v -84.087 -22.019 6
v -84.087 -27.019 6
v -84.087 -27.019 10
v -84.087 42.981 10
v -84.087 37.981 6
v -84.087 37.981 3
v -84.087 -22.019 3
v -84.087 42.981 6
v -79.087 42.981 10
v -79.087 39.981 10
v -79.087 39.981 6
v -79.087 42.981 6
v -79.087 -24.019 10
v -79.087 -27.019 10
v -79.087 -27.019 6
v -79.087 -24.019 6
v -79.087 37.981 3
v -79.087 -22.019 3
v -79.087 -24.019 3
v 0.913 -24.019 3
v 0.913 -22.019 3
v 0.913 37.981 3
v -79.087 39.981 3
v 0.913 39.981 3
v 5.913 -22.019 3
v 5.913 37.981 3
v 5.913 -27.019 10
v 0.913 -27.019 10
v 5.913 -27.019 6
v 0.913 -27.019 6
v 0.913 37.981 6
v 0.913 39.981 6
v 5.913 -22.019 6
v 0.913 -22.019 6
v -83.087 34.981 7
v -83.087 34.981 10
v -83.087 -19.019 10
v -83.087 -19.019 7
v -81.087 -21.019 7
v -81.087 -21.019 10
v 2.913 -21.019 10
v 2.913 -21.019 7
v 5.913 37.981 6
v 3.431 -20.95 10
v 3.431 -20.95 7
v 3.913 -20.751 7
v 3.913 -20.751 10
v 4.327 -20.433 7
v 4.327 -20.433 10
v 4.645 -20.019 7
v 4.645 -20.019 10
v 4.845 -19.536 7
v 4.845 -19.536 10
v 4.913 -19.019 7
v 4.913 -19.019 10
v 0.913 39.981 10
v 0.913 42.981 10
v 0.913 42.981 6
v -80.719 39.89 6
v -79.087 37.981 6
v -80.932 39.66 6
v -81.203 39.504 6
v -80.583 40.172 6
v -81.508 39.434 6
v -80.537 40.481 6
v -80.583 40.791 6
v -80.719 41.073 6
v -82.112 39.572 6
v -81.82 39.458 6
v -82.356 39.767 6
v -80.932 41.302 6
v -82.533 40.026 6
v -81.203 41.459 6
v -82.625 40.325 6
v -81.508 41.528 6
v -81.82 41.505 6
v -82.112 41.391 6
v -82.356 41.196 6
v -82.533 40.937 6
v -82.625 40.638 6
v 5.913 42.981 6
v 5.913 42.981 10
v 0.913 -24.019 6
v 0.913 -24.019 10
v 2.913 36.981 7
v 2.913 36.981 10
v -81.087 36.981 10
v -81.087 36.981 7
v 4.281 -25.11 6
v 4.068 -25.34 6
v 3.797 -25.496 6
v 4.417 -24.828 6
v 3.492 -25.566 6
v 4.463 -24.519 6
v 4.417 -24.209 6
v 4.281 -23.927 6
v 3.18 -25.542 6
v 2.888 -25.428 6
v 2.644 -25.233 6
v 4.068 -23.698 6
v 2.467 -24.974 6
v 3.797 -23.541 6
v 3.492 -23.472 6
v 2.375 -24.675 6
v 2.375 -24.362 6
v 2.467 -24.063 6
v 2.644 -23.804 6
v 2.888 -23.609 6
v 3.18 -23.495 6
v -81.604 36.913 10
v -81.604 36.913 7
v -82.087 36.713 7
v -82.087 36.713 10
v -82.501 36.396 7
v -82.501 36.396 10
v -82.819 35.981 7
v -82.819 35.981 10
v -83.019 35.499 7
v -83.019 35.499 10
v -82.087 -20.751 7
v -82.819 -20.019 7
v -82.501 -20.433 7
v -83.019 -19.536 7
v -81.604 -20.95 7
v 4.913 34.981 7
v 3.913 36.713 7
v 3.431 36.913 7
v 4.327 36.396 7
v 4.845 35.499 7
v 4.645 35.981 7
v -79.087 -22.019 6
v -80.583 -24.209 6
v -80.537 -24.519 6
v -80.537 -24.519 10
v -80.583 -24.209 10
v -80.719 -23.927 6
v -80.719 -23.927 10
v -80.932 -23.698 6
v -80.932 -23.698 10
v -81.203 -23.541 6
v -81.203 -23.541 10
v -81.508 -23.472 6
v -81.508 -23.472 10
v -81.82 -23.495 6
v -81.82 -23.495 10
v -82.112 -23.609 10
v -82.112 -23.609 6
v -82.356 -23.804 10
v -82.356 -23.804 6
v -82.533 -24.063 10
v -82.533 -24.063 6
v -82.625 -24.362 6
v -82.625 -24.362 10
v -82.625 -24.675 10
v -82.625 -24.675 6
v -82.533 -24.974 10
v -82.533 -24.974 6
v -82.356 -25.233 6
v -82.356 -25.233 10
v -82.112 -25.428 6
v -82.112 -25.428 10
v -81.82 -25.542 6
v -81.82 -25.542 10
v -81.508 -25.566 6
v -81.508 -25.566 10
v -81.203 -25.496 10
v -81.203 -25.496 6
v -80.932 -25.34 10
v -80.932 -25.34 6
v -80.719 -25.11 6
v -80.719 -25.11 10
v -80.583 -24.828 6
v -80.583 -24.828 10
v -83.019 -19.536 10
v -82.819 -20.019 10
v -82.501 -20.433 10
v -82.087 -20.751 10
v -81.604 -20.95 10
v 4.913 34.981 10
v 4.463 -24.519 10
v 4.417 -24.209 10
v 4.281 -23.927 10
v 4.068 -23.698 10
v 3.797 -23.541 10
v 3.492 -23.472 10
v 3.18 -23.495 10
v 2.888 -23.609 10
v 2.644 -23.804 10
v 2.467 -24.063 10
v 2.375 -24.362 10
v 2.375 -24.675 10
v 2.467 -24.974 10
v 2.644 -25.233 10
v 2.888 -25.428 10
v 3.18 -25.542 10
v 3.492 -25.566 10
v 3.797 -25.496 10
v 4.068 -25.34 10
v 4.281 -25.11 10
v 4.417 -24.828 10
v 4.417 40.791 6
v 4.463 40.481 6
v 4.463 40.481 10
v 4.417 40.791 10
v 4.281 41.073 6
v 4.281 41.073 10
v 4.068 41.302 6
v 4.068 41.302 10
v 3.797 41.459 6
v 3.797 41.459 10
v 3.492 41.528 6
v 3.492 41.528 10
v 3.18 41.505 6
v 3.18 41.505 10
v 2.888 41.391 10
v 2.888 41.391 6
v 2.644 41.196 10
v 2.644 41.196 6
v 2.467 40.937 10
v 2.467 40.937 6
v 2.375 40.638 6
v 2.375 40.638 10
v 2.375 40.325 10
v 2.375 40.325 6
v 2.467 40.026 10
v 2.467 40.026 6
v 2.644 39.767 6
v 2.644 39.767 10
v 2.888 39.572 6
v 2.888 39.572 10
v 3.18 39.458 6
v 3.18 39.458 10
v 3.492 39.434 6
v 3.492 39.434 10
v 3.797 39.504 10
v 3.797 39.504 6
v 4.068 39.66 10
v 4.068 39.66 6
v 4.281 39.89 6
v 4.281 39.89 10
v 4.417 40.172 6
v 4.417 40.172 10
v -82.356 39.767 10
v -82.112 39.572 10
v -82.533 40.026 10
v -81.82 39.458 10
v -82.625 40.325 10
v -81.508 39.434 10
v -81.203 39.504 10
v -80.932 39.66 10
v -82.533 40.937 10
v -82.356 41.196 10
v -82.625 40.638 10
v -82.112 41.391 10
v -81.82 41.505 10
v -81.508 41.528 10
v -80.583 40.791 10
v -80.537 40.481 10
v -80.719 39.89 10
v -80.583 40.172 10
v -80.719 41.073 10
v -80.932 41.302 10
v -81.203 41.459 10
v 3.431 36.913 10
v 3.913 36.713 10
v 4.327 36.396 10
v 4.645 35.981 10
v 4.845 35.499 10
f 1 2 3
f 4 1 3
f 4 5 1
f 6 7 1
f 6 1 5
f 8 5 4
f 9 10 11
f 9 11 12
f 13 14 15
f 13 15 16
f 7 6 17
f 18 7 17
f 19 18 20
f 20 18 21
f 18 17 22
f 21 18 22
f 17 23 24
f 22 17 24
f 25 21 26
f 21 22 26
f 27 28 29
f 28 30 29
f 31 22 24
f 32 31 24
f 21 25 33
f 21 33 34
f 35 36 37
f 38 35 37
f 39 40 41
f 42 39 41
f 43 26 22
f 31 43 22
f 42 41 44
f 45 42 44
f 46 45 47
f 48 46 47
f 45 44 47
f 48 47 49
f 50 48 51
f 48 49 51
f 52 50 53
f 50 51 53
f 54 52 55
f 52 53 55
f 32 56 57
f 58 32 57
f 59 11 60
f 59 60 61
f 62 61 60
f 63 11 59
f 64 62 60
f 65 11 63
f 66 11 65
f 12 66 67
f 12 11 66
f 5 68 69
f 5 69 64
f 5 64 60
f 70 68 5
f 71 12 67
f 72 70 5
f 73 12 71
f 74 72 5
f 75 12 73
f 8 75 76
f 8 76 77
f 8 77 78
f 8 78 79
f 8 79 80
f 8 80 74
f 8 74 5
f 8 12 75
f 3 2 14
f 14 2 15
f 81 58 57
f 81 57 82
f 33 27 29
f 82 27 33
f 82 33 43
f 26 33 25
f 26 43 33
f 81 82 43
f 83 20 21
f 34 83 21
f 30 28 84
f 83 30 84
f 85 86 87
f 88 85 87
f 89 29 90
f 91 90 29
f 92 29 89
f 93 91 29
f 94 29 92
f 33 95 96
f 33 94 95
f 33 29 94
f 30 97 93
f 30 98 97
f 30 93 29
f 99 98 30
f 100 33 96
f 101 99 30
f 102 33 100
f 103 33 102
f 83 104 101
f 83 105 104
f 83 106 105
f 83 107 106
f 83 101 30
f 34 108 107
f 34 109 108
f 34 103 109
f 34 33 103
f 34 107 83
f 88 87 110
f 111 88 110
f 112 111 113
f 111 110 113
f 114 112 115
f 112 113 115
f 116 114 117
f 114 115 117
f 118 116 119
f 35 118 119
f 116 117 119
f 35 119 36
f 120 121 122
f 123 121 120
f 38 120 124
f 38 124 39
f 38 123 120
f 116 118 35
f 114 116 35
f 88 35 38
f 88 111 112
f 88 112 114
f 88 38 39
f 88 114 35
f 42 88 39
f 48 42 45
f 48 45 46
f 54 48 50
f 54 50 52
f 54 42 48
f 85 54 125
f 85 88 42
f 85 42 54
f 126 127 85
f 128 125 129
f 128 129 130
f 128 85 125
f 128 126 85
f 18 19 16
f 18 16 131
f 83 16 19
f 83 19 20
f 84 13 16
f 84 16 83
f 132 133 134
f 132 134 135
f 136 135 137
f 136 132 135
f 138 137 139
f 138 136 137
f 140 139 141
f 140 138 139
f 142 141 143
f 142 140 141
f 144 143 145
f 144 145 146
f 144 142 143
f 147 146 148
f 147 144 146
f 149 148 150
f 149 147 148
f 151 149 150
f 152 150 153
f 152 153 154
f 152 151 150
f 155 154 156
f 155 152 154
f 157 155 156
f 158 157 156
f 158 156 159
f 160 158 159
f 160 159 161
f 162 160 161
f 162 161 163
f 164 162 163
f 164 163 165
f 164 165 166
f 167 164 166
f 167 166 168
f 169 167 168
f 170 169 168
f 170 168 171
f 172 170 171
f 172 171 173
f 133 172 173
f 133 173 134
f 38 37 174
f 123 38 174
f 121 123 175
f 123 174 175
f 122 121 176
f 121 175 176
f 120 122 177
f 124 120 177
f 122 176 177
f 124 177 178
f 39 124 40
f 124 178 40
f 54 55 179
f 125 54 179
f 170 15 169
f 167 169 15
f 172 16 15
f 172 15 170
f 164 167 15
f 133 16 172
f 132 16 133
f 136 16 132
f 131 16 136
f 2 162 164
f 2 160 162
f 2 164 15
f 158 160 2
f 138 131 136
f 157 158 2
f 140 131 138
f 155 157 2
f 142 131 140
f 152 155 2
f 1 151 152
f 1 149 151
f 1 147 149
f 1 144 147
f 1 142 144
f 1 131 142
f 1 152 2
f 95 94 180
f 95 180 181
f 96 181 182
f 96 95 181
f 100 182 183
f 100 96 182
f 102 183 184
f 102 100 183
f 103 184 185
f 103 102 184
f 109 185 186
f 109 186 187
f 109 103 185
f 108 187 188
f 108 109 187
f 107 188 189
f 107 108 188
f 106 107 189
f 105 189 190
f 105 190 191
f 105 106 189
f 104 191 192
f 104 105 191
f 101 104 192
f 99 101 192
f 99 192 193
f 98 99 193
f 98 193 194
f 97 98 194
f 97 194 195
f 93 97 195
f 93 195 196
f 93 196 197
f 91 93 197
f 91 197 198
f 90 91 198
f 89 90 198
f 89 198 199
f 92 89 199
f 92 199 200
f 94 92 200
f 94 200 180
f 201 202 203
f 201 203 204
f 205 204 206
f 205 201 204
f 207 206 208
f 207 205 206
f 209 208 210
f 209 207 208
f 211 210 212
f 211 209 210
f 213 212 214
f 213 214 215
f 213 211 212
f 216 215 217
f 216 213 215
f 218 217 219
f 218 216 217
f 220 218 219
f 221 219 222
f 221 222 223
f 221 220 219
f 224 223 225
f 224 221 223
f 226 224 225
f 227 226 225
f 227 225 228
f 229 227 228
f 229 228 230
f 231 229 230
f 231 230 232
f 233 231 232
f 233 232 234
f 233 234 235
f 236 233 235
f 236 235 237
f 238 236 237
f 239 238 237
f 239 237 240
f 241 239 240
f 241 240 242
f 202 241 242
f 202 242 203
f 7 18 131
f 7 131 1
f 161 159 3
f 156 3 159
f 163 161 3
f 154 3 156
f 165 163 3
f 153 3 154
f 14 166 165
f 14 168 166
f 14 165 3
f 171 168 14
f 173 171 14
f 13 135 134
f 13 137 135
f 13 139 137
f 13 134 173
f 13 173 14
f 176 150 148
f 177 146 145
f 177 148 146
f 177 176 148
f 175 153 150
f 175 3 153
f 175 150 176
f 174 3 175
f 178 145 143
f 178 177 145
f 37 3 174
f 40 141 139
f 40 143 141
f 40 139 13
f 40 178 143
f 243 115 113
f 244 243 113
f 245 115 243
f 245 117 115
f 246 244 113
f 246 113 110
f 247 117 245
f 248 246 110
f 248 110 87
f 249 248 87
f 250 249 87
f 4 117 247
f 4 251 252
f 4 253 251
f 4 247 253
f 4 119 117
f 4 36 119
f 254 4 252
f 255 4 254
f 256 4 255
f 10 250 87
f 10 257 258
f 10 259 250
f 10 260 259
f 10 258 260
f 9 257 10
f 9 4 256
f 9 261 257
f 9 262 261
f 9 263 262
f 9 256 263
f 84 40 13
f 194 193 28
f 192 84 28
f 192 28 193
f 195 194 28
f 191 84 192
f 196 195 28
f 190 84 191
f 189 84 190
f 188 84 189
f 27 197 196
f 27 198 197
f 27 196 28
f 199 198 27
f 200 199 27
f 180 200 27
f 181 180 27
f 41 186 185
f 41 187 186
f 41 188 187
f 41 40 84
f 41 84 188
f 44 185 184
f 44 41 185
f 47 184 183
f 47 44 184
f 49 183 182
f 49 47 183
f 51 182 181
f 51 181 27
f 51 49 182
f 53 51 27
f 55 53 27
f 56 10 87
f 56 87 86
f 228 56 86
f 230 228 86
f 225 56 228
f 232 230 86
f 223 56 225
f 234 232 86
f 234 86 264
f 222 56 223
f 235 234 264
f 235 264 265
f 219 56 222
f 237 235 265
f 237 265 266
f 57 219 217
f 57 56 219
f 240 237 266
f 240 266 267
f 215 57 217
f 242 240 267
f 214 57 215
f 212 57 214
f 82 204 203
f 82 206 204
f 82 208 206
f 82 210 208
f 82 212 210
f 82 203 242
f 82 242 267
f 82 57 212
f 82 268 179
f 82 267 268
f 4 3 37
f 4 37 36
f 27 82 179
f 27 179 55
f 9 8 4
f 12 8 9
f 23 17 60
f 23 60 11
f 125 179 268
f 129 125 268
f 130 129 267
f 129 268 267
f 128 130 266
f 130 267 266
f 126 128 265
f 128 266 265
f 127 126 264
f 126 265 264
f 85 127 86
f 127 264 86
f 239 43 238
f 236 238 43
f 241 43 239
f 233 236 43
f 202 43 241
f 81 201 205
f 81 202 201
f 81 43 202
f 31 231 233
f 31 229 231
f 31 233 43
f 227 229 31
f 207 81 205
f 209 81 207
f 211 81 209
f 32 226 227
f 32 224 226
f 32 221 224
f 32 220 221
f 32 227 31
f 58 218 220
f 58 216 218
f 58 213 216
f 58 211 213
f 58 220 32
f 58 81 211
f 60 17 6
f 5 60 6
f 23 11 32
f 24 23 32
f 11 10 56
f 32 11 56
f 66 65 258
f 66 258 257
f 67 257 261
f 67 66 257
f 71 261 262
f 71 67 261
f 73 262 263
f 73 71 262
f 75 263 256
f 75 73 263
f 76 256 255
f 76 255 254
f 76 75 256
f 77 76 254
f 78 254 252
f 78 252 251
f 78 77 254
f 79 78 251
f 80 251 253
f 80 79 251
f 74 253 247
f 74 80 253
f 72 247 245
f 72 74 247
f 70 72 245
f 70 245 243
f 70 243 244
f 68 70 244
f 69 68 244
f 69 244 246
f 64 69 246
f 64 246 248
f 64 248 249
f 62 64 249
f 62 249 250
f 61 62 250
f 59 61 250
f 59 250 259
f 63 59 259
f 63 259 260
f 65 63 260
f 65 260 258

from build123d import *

# Parameters (mm, degrees)
SKETCH_1_W           = 100
SKETCH_1_H           = 70
EXTRUDE_1_DEPTH      = 10
SKETCH_6_W           = 5
SKETCH_6_H           = 5
CUT_EXTRUDE_4_DEPTH  = 5
SKETCH_7_W           = 5
SKETCH_7_H           = 5
CUT_EXTRUDE_5_DEPTH  = 3
SKETCH_8_R           = 1.05
CUT_EXTRUDE_6_DEPTH  = 42
SKETCH_10_W          = 100
SKETCH_10_H          = 70
CUT_EXTRUDE_7_DEPTH  = 3
SKETCH_11_W          = 7
SKETCH_11_H          = 70
CUT_EXTRUDE_8_DEPTH  = 5
SKETCH_12_W          = 7
SKETCH_12_H          = 70
CUT_EXTRUDE_9_DEPTH  = 5
SKETCH_15_W          = 82
SKETCH_15_H          = 52
CUT_EXTRUDE_12_DEPTH = 3
SKETCH_16_W          = 5
SKETCH_16_H          = 5
SKETCH_16_R          = 1.05
EXTRUDE_2_DEPTH      = 5
SKETCH_18_W          = 80
SKETCH_18_H          = 3
CUT_EXTRUDE_13_DEPTH = 10
SKETCH_19_W          = 82
SKETCH_19_H          = 52
CUT_EXTRUDE_14_DEPTH = 3
SKETCH_20_W          = 5
SKETCH_20_H          = 5
CUT_EXTRUDE_15_DEPTH = 3


with BuildPart() as part:
    # 草圖1 → 填料-伸長1 (new body)
    with BuildSketch(Plane.XY):
        with Locations((-39.08671555, 7.98136646)):
            Rectangle(SKETCH_1_W, SKETCH_1_H)
    extrude(amount=EXTRUDE_1_DEPTH)

    # 草圖6 → 除料-伸長4 (cut)
    with BuildSketch(Plane.XY.offset(10)):
        with Locations((3.41328445, 40.48136646)):
            Rectangle(SKETCH_6_W, SKETCH_6_H)
        with Locations((-81.58671555, 40.48136646)):
            Rectangle(SKETCH_6_W, SKETCH_6_H)
        with Locations((-81.58671555, -24.51863354)):
            Rectangle(SKETCH_6_W, SKETCH_6_H)
        with Locations((3.41328445, -24.51863354)):
            Rectangle(SKETCH_6_W, SKETCH_6_H)
    extrude(amount=-CUT_EXTRUDE_4_DEPTH, mode=Mode.SUBTRACT)

    # 草圖7 → 除料-伸長5 (cut)
    with BuildSketch(Plane(origin=(0, 0, 0), x_dir=(-1, 0, 0), z_dir=(0, 0, -1))):
        with Locations((81.58671555, 40.48136646)):
            Rectangle(SKETCH_7_W, SKETCH_7_H)
        with Locations((-3.41328445, 40.48136646)):
            Rectangle(SKETCH_7_W, SKETCH_7_H)
        with Locations((81.58671555, -24.51863354)):
            Rectangle(SKETCH_7_W, SKETCH_7_H)
        with Locations((-3.41328445, -24.51863354)):
            Rectangle(SKETCH_7_W, SKETCH_7_H)
    extrude(amount=-CUT_EXTRUDE_5_DEPTH, mode=Mode.SUBTRACT)

    # 草圖8 → 除料-伸長6 (cut)
    with BuildSketch(Plane(origin=(0, 0, 0), x_dir=(-1, 0, 0), z_dir=(0, 0, -1))):
        with Locations((-3.41328445, 40.48136646)):
            Circle(SKETCH_8_R)
        with Locations((81.58671555, 40.48136646)):
            Circle(SKETCH_8_R)
        with Locations((81.58671555, -24.51863354)):
            Circle(SKETCH_8_R)
        with Locations((-3.41328445, -24.51863354)):
            Circle(SKETCH_8_R)
    extrude(amount=-CUT_EXTRUDE_6_DEPTH, mode=Mode.SUBTRACT)

    # 草圖10 → 除料-伸長7 (cut)
    with BuildSketch(Plane.XY):
        with Locations((-39.08671555, 7.98136646)):
            Rectangle(SKETCH_10_W, SKETCH_10_H)
    extrude(amount=CUT_EXTRUDE_7_DEPTH, mode=Mode.SUBTRACT)

    # 草圖11 → 除料-伸長8 (cut)
    with BuildSketch(Plane(origin=(10.91328445, 0, 0), x_dir=(0, 0, -1), z_dir=(1, 0, 0))):
        with Locations((-6.5, 7.98136646)):
            Rectangle(SKETCH_11_W, SKETCH_11_H)
    extrude(amount=-CUT_EXTRUDE_8_DEPTH, mode=Mode.SUBTRACT)

    # 草圖12 → 除料-伸長9 (cut)
    with BuildSketch(Plane.ZY.offset(89.08671555)):
        with Locations((6.5, 7.98136646)):
            Rectangle(SKETCH_12_W, SKETCH_12_H)
    extrude(amount=-CUT_EXTRUDE_9_DEPTH, mode=Mode.SUBTRACT)

    # 草圖15 → 除料-伸長12 (cut)
    with BuildSketch(Plane.XY.offset(10)):
        with BuildLine():
            Line((-83.08671555, 34.98136646), (-83.08671555, -19.01863354))
            ThreePointArc((-83.08671555, -19.01863354), (-82.500929112, -20.432847103), (-81.08671555, -21.01863354))
            Line((-81.08671555, -21.01863354), (2.91328445, -21.01863354))
            ThreePointArc((2.91328445, -21.01863354), (4.327498013, -20.432847103), (4.91328445, -19.01863354))
            Line((4.91328445, -19.01863354), (4.91328445, 34.98136646))
            ThreePointArc((4.91328445, 34.98136646), (4.327498013, 36.395580022), (2.91328445, 36.98136646))
            Line((2.91328445, 36.98136646), (-81.08671555, 36.98136646))
            ThreePointArc((-81.08671555, 36.98136646), (-82.500929112, 36.395580022), (-83.08671555, 34.98136646))
        make_face()
        with Locations((-39.08671555, 7.98136646)):
            Rectangle(SKETCH_15_W, SKETCH_15_H, mode=Mode.SUBTRACT)
    extrude(amount=-CUT_EXTRUDE_12_DEPTH, mode=Mode.SUBTRACT)

    # 草圖16 → 填料-伸長2 (add)
    with BuildSketch(Plane.XY.offset(5)):
        with Locations((-81.58671555, 40.48136646)):
            Rectangle(SKETCH_16_W, SKETCH_16_H)
        with Locations((-81.58671555, 40.48136646)):
            Circle(SKETCH_16_R, mode=Mode.SUBTRACT)
        with Locations((3.41328445, 40.48136646)):
            Rectangle(SKETCH_16_W, SKETCH_16_H)
        with Locations((3.41328445, 40.48136646)):
            Circle(SKETCH_16_R, mode=Mode.SUBTRACT)
        with Locations((3.41328445, -24.51863354)):
            Rectangle(SKETCH_16_W, SKETCH_16_H)
        with Locations((3.41328445, -24.51863354)):
            Circle(SKETCH_16_R, mode=Mode.SUBTRACT)
        with Locations((-81.58671555, -24.51863354)):
            Rectangle(SKETCH_16_W, SKETCH_16_H)
        with Locations((-81.58671555, -24.51863354)):
            Circle(SKETCH_16_R, mode=Mode.SUBTRACT)
    extrude(amount=EXTRUDE_2_DEPTH)

    # 草圖18 → 除料-伸長13 (cut)
    with BuildSketch(Plane.XY.offset(10)):
        with Locations((-39.08671555, 41.48136646)):
            Rectangle(SKETCH_18_W, SKETCH_18_H)
        with Locations((-39.08671555, -25.51863354)):
            Rectangle(SKETCH_18_W, SKETCH_18_H)
    extrude(amount=-CUT_EXTRUDE_13_DEPTH, mode=Mode.SUBTRACT)

    # 草圖19 → 除料-伸長14 (cut)
    with BuildSketch(Plane.XY.offset(10)):
        with Locations((-39.08671555, 7.98136646)):
            Rectangle(SKETCH_19_W, SKETCH_19_H)
    extrude(amount=-CUT_EXTRUDE_14_DEPTH, mode=Mode.SUBTRACT)

    # 草圖20 → 除料-伸長15 (cut)
    with BuildSketch(Plane(origin=(0, 0, 3), x_dir=(-1, 0, 0), z_dir=(0, 0, -1))):
        with Locations((81.58671555, 40.48136646)):
            Rectangle(SKETCH_20_W, SKETCH_20_H)
        with Locations((-3.41328445, 40.48136646)):
            Rectangle(SKETCH_20_W, SKETCH_20_H)
        with Locations((81.58671555, -24.51863354)):
            Rectangle(SKETCH_20_W, SKETCH_20_H)
        with Locations((-3.41328445, -24.51863354)):
            Rectangle(SKETCH_20_W, SKETCH_20_H)
    extrude(amount=-CUT_EXTRUDE_15_DEPTH, mode=Mode.SUBTRACT)


solid = part.part
